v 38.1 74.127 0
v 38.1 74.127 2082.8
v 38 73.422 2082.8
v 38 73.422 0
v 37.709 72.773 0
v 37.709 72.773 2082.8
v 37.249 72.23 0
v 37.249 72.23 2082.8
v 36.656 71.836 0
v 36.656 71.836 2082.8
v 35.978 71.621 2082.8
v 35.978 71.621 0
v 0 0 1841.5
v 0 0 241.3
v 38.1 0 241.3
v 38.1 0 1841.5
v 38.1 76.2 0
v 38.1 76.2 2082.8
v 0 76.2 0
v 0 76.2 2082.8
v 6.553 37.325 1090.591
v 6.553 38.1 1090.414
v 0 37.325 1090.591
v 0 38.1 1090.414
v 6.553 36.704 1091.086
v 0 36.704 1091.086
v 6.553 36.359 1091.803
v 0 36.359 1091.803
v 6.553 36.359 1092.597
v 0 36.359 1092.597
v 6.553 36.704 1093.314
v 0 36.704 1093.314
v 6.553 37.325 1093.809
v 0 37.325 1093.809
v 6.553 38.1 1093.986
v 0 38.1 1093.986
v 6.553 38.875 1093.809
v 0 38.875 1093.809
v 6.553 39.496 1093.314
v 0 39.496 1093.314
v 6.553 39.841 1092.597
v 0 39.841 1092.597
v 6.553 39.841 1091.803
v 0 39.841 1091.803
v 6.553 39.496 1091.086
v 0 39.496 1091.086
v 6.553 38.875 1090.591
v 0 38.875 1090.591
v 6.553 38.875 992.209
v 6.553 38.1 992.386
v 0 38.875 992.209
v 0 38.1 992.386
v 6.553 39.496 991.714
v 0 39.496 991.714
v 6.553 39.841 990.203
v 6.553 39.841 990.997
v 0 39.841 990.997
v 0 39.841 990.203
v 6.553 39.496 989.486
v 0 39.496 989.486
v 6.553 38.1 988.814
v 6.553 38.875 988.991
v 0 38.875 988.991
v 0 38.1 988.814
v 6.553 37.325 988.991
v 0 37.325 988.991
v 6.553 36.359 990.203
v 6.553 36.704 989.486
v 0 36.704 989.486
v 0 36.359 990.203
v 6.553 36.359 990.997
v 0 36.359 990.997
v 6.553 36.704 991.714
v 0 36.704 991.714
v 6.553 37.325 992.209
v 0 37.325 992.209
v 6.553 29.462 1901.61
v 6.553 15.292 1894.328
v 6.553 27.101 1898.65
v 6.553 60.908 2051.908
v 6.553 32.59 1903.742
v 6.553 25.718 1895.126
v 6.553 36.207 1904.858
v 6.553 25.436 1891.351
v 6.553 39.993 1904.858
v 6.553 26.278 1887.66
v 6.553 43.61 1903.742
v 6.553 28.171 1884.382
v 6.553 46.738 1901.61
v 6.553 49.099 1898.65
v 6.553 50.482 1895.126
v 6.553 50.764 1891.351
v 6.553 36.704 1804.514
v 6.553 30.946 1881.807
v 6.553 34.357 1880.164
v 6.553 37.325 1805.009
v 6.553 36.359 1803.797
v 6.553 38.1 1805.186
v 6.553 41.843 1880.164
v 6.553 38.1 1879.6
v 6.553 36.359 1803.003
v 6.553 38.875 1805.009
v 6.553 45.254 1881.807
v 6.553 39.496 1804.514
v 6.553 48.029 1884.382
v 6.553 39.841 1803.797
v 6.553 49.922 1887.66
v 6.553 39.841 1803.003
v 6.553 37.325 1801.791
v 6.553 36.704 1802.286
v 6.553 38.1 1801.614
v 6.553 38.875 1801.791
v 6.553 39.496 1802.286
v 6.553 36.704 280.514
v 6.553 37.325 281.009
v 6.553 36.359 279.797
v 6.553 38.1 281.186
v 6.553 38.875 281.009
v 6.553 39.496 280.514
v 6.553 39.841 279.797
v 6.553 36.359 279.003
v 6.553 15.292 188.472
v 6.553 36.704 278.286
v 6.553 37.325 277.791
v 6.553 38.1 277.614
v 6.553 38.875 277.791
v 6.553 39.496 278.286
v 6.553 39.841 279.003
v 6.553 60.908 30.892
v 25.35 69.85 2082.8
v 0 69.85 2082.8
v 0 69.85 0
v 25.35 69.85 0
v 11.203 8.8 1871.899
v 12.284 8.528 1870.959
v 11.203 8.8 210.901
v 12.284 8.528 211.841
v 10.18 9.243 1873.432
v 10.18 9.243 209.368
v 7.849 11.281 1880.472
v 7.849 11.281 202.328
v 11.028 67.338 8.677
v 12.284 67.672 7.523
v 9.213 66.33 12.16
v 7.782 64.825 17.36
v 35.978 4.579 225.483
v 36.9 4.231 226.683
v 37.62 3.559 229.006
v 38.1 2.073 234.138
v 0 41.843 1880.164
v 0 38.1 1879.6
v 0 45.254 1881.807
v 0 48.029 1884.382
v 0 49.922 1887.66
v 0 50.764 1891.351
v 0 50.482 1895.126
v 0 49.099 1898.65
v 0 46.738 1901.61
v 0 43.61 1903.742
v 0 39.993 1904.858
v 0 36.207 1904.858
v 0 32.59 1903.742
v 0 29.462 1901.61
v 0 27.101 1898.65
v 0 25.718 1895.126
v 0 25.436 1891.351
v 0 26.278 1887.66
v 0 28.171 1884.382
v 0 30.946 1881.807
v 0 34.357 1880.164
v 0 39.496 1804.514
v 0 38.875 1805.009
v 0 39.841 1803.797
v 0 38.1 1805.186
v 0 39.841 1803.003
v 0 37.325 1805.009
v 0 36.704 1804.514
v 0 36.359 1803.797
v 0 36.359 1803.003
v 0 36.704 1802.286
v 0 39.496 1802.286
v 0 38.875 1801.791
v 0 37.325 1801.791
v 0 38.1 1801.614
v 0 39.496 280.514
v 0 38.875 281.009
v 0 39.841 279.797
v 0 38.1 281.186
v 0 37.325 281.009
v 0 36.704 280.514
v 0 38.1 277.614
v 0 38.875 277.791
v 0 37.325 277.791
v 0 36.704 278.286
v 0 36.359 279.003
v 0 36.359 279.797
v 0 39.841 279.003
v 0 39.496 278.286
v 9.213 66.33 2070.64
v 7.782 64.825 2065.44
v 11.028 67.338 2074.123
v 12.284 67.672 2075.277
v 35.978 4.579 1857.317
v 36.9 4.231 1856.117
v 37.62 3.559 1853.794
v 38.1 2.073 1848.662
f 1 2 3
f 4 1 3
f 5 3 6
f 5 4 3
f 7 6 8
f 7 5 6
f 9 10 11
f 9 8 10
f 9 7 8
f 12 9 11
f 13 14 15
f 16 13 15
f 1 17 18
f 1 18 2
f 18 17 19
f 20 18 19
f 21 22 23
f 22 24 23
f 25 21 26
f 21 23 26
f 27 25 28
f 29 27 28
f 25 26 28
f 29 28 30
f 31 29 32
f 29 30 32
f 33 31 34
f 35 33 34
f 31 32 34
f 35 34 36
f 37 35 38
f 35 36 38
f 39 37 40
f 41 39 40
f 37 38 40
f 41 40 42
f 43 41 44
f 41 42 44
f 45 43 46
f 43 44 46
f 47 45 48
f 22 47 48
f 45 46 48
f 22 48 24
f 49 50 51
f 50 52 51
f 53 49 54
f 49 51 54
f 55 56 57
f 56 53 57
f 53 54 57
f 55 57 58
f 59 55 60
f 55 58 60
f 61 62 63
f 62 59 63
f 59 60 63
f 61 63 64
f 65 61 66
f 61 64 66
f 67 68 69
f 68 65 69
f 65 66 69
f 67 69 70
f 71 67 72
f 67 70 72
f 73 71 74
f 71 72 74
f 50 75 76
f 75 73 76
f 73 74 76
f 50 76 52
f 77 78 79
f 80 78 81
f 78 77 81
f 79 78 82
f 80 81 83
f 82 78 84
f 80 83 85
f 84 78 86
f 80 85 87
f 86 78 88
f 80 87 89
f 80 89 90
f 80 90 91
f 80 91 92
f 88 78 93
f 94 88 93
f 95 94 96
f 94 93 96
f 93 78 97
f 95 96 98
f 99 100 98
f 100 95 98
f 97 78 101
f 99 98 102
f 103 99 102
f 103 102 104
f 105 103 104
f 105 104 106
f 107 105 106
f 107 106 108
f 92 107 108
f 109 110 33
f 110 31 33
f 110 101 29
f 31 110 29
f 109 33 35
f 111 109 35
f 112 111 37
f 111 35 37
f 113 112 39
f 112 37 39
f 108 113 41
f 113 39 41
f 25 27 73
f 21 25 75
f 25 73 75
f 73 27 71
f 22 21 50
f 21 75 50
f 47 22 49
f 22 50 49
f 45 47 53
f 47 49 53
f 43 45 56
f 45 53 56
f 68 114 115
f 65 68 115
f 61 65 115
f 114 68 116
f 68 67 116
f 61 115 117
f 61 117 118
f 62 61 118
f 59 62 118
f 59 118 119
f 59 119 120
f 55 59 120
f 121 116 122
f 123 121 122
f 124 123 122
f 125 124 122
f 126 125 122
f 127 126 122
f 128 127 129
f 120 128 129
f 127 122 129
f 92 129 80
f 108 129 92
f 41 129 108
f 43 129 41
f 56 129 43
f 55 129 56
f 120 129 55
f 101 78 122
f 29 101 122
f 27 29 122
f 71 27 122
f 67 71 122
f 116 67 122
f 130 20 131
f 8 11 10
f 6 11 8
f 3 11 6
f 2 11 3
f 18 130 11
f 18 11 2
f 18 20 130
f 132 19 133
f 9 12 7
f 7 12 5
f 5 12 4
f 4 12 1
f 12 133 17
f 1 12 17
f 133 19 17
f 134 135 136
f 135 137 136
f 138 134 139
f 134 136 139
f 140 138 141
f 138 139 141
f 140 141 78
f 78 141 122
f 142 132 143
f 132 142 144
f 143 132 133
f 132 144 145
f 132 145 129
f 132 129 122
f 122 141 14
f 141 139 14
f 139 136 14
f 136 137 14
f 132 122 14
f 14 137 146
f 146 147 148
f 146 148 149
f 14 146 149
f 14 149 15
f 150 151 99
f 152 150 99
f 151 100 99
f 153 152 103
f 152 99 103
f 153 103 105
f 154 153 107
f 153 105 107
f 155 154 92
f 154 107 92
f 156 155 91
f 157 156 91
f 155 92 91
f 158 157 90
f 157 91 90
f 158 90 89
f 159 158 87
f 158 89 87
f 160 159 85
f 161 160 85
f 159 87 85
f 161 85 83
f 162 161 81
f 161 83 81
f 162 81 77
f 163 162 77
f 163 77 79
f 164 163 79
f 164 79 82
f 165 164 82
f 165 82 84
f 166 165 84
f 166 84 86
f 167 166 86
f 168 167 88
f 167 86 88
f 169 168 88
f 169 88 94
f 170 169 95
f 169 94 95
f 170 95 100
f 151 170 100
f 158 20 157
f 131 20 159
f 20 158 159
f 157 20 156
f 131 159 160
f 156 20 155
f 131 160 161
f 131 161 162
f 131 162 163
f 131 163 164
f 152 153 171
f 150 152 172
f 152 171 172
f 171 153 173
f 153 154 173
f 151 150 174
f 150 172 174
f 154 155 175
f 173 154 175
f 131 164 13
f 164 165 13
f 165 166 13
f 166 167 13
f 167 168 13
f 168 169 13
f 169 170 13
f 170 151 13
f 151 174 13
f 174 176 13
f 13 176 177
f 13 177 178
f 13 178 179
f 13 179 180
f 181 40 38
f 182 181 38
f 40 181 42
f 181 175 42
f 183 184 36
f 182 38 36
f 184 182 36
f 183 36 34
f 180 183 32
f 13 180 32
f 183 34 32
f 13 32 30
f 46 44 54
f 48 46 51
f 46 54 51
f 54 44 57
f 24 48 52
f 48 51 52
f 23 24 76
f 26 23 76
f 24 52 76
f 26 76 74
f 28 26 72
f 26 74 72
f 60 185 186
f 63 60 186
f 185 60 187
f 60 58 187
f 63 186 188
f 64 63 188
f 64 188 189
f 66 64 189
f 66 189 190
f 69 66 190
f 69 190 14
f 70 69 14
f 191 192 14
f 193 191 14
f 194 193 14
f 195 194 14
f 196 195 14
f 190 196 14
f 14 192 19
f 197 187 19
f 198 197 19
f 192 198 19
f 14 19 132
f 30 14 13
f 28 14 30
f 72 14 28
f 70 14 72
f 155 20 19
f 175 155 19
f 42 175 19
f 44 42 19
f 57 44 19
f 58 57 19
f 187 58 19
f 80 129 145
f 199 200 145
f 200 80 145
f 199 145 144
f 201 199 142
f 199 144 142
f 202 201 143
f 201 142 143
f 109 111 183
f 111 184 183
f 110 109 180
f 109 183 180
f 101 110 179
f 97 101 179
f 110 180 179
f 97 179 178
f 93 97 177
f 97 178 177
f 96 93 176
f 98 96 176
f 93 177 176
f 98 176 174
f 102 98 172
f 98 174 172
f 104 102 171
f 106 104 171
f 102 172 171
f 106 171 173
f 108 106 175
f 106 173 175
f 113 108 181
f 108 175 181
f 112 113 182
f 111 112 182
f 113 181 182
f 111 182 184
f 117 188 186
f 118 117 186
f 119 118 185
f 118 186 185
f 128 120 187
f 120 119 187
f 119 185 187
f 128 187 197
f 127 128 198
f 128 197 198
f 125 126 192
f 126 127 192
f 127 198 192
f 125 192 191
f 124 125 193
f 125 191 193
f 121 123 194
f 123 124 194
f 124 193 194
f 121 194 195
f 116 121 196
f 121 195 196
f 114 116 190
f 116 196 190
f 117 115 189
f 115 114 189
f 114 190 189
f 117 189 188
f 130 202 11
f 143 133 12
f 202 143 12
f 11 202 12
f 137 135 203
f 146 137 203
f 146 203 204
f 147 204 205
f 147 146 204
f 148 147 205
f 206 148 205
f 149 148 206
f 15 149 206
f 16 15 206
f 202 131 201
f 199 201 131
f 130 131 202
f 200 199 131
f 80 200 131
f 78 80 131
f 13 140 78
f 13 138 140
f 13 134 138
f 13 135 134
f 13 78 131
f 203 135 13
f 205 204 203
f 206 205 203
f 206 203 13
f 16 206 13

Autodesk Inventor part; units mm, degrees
ref_plane "YZ Plane" through (0, 0, 0) normal (1, 0, 0) x (0, 1, 0)
ref_plane "XZ Plane" through (0, 0, 0) normal (0, 1, 0) x (-1, 0, 0)
sketch "Sketch1" plane through (0, 0, 0) normal (0, 0, 1) x (1, 0, 0)
  line L0 (0, 0) -> (38.1, 0)
  line L1 (38.1, 76.2) -> (0, 76.2)
  line L2 (0, 76.2) -> (0, 0)
  line L3 (6.5532, 15.2924) -> (6.5532, 60.9076)
  line L4 (12.2838, 67.6723) -> (35.9776, 71.6213)
  line L5 (38.1, 76.2) -> (38.1, 74.1267)
  line L6 (12.2838, 8.5277) -> (35.9776, 4.5787)
  line L7 (38.1, 0) -> (38.1, 2.0733)
  line L8 (24.1307, 69.6468) -> (19.4329, 69.6468)
  arc A0 (38.1, 2.0733) -> (35.9776, 4.5787) centre (35.56, 2.0733) ccw
  arc A1 (35.9776, 71.6213) -> (38.1, 74.1267) centre (35.56, 74.1267) ccw
  arc A2 (6.5532, 15.2924) -> (12.2838, 8.5277) centre (13.4112, 15.2924) ccw
  arc A3 (12.2838, 67.6723) -> (6.5532, 60.9076) centre (13.4112, 60.9076) ccw
  line L9 (0, 91.44) -> (0, -15.24) projected
  line L10 (-7.7119, 0) -> (46.2711, 0) projected
  point P0 (38.1, 71.975)
  dimension "d15" = 76.2
  dimension "d25" = 6.5532
  dimension "d26" = 38.1
  dimension "d28" = 6.5532
  dimension "d29" = 2.54
  dimension "d30" = 6.858
extrude "Extrusion1" add sketch "Sketch1" along normal blind 2082.8
sketch "Sketch2" plane through (38.1, 74.1267, 2082.8) normal (1, 0, 0) x (0, 0, -1)
  line L0 (0, 0) -> (959.8939, -1.971)
  line L1 (0, -74.1267) -> (0, -4.2767)
  line L2 (0, -4.2767) -> (241.3, -74.1267)
  line L3 (241.3, -74.1267) -> (0, -74.1267)
  line L4 (2082.8, -74.1267) -> (2082.8, -4.2767)
  line L5 (2082.8, -4.2767) -> (1841.5, -74.1267)
  line L6 (1841.5, -74.1267) -> (2082.8, -74.1267)
  line L7 (2082.8, -74.1267) -> (0, -74.1267) projected
  line L8 (0, -74.1267) -> (0, 2.0733) projected
  line L9 (2082.8, 2.0733) -> (2082.8, -74.1267) projected
  dimension "d19" = 241.3
  dimension "d20" = 69.85
  dimension "d21" = 241.3
  dimension "d31" = 69.85
extrude "Extrusion2" cut sketch "Sketch2" against normal blind 304.8
sketch "Sketch3" plane through (6.5532, 60.9076, 2051.9082) normal (1, 0, 0) x (0, 0, -1)
  line L0 (1863.4364, -45.6153) -> (157.58, -45.6153) projected
  circle A0 centre (159.6082, -22.8076) radius 12.7
  line L1 (172.3082, -7.5153) -> (1848.7082, -7.5153)
  line L2 (1848.7082, -7.5153) -> (1848.7082, -42.4403)
  line L3 (1848.7082, -42.4403) -> (172.3082, -42.4403)
  line L4 (172.3082, -42.4403) -> (172.3082, -7.5153)
  line L5 (-30.8918, 8.9424) -> (-30.8918, 15.2924) projected
  line L6 (181.8332, -9.1028) -> (213.5832, -9.1028)
  line L7 (213.5832, -9.1028) -> (213.5832, -40.8528)
  line L8 (213.5832, -40.8528) -> (181.8332, -40.8528)
  line L9 (181.8332, -40.8528) -> (181.8332, -9.1028)
  line L10 (283.4332, -9.1028) -> (315.1832, -9.1028)
  line L11 (315.1832, -9.1028) -> (315.1832, -40.8528)
  line L12 (315.1832, -40.8528) -> (283.4332, -40.8528)
  line L13 (283.4332, -40.8528) -> (283.4332, -9.1028)
  line L14 (385.0332, -9.1028) -> (416.7832, -9.1028)
  line L15 (416.7832, -9.1028) -> (416.7832, -40.8528)
  line L16 (416.7832, -40.8528) -> (385.0332, -40.8528)
  line L17 (385.0332, -40.8528) -> (385.0332, -9.1028)
  line L18 (486.6332, -9.1028) -> (518.3832, -9.1028)
  line L19 (518.3832, -9.1028) -> (518.3832, -40.8528)
  line L20 (518.3832, -40.8528) -> (486.6332, -40.8528)
  line L21 (486.6332, -40.8528) -> (486.6332, -9.1028)
  line L22 (588.2332, -9.1028) -> (619.9832, -9.1028)
  line L23 (619.9832, -9.1028) -> (619.9832, -40.8528)
  line L24 (619.9832, -40.8528) -> (588.2332, -40.8528)
  line L25 (588.2332, -40.8528) -> (588.2332, -9.1028)
  line L26 (689.8332, -9.1028) -> (721.5832, -9.1028)
  line L27 (721.5832, -9.1028) -> (721.5832, -40.8528)
  line L28 (721.5832, -40.8528) -> (689.8332, -40.8528)
  line L29 (689.8332, -40.8528) -> (689.8332, -9.1028)
  line L30 (791.4332, -9.1028) -> (823.1832, -9.1028)
  line L31 (823.1832, -9.1028) -> (823.1832, -40.8528)
  line L32 (823.1832, -40.8528) -> (791.4332, -40.8528)
  line L33 (791.4332, -40.8528) -> (791.4332, -9.1028)
  line L34 (893.0332, -9.1028) -> (924.7832, -9.1028)
  line L35 (924.7832, -9.1028) -> (924.7832, -40.8528)
  line L36 (924.7832, -40.8528) -> (893.0332, -40.8528)
  line L37 (893.0332, -40.8528) -> (893.0332, -9.1028)
  line L38 (994.6332, -9.1028) -> (1026.3832, -9.1028)
  line L39 (1026.3832, -9.1028) -> (1026.3832, -40.8528)
  line L40 (1026.3832, -40.8528) -> (994.6332, -40.8528)
  line L41 (994.6332, -40.8528) -> (994.6332, -9.1028)
  line L42 (1096.2332, -9.1028) -> (1127.9832, -9.1028)
  line L43 (1127.9832, -9.1028) -> (1127.9832, -40.8528)
  line L44 (1127.9832, -40.8528) -> (1096.2332, -40.8528)
  line L45 (1096.2332, -40.8528) -> (1096.2332, -9.1028)
  line L46 (1197.8332, -9.1028) -> (1229.5832, -9.1028)
  line L47 (1229.5832, -9.1028) -> (1229.5832, -40.8528)
  line L48 (1229.5832, -40.8528) -> (1197.8332, -40.8528)
  line L49 (1197.8332, -40.8528) -> (1197.8332, -9.1028)
  line L50 (1299.4332, -9.1028) -> (1331.1832, -9.1028)
  line L51 (1331.1832, -9.1028) -> (1331.1832, -40.8528)
  line L52 (1331.1832, -40.8528) -> (1299.4332, -40.8528)
  line L53 (1299.4332, -40.8528) -> (1299.4332, -9.1028)
  line L54 (1401.0332, -9.1028) -> (1432.7832, -9.1028)
  line L55 (1432.7832, -9.1028) -> (1432.7832, -40.8528)
  line L56 (1432.7832, -40.8528) -> (1401.0332, -40.8528)
  line L57 (1401.0332, -40.8528) -> (1401.0332, -9.1028)
  line L58 (1502.6332, -9.1028) -> (1534.3832, -9.1028)
  line L59 (1534.3832, -9.1028) -> (1534.3832, -40.8528)
  line L60 (1534.3832, -40.8528) -> (1502.6332, -40.8528)
  line L61 (1502.6332, -40.8528) -> (1502.6332, -9.1028)
  line L62 (1604.2332, -9.1028) -> (1635.9832, -9.1028)
  line L63 (1635.9832, -9.1028) -> (1635.9832, -40.8528)
  line L64 (1635.9832, -40.8528) -> (1604.2332, -40.8528)
  line L65 (1604.2332, -40.8528) -> (1604.2332, -9.1028)
  line L66 (1705.8332, -9.1028) -> (1737.5832, -9.1028)
  line L67 (1737.5832, -9.1028) -> (1737.5832, -40.8528)
  line L68 (1737.5832, -40.8528) -> (1705.8332, -40.8528)
  line L69 (1705.8332, -40.8528) -> (1705.8332, -9.1028)
  line L70 (1807.4332, -9.1028) -> (1839.1832, -9.1028)
  line L71 (1839.1832, -9.1028) -> (1839.1832, -40.8528)
  line L72 (1839.1832, -40.8528) -> (1807.4332, -40.8528)
  line L73 (1807.4332, -40.8528) -> (1807.4332, -9.1028)
  line L74 (2051.9082, 15.2924) -> (-30.8918, 15.2924) projected
  line L75 (1010.5082, -7.5153) -> (1010.5082, -42.4403)
  point P0 (2051.9082, -60.9076)
  dimension "d32" = 25.4
  dimension "d33" = 34.925
  dimension "d34" = 3.175
  dimension "d35" = 1676.4
  dimension "d36" = 203.2
  dimension "d37" = 31.75
  dimension "d38" = 1.5875
  dimension "d41" = 101.6
  dimension "d46" = 190.5
  dimension "d47" = 38.1
  dimension "d48" = 9.525
  dimension "d63" = 838.2
extrude "Extrusion3" cut sketch "Sketch3" against normal blind 25.4 contours A0
hole "Hole1" at (6.5532, 38.1, 1803.4) direction (-1, 0, 0) diameter 3.5719 depth 25.4 tip angle 118
pattern_linear "Rectangular Pattern1" count 2 spacing 711.2 along (0, 0, -1) of "Hole1"
ref_plane "Work Plane1" through (0, 0, 1041.4) normal (0, 0, 1) x (1, 0, 0)
mirror "Mirror1" about plane through (0, 0, 1041.4) normal (0, 0, 1) of "Hole1", "Rectangular Pattern1"
equation "\"d21\" = d19"
equation "\"d31\" = d20"
properties part number "GE-12019-03" material "Aluminum-6061"
